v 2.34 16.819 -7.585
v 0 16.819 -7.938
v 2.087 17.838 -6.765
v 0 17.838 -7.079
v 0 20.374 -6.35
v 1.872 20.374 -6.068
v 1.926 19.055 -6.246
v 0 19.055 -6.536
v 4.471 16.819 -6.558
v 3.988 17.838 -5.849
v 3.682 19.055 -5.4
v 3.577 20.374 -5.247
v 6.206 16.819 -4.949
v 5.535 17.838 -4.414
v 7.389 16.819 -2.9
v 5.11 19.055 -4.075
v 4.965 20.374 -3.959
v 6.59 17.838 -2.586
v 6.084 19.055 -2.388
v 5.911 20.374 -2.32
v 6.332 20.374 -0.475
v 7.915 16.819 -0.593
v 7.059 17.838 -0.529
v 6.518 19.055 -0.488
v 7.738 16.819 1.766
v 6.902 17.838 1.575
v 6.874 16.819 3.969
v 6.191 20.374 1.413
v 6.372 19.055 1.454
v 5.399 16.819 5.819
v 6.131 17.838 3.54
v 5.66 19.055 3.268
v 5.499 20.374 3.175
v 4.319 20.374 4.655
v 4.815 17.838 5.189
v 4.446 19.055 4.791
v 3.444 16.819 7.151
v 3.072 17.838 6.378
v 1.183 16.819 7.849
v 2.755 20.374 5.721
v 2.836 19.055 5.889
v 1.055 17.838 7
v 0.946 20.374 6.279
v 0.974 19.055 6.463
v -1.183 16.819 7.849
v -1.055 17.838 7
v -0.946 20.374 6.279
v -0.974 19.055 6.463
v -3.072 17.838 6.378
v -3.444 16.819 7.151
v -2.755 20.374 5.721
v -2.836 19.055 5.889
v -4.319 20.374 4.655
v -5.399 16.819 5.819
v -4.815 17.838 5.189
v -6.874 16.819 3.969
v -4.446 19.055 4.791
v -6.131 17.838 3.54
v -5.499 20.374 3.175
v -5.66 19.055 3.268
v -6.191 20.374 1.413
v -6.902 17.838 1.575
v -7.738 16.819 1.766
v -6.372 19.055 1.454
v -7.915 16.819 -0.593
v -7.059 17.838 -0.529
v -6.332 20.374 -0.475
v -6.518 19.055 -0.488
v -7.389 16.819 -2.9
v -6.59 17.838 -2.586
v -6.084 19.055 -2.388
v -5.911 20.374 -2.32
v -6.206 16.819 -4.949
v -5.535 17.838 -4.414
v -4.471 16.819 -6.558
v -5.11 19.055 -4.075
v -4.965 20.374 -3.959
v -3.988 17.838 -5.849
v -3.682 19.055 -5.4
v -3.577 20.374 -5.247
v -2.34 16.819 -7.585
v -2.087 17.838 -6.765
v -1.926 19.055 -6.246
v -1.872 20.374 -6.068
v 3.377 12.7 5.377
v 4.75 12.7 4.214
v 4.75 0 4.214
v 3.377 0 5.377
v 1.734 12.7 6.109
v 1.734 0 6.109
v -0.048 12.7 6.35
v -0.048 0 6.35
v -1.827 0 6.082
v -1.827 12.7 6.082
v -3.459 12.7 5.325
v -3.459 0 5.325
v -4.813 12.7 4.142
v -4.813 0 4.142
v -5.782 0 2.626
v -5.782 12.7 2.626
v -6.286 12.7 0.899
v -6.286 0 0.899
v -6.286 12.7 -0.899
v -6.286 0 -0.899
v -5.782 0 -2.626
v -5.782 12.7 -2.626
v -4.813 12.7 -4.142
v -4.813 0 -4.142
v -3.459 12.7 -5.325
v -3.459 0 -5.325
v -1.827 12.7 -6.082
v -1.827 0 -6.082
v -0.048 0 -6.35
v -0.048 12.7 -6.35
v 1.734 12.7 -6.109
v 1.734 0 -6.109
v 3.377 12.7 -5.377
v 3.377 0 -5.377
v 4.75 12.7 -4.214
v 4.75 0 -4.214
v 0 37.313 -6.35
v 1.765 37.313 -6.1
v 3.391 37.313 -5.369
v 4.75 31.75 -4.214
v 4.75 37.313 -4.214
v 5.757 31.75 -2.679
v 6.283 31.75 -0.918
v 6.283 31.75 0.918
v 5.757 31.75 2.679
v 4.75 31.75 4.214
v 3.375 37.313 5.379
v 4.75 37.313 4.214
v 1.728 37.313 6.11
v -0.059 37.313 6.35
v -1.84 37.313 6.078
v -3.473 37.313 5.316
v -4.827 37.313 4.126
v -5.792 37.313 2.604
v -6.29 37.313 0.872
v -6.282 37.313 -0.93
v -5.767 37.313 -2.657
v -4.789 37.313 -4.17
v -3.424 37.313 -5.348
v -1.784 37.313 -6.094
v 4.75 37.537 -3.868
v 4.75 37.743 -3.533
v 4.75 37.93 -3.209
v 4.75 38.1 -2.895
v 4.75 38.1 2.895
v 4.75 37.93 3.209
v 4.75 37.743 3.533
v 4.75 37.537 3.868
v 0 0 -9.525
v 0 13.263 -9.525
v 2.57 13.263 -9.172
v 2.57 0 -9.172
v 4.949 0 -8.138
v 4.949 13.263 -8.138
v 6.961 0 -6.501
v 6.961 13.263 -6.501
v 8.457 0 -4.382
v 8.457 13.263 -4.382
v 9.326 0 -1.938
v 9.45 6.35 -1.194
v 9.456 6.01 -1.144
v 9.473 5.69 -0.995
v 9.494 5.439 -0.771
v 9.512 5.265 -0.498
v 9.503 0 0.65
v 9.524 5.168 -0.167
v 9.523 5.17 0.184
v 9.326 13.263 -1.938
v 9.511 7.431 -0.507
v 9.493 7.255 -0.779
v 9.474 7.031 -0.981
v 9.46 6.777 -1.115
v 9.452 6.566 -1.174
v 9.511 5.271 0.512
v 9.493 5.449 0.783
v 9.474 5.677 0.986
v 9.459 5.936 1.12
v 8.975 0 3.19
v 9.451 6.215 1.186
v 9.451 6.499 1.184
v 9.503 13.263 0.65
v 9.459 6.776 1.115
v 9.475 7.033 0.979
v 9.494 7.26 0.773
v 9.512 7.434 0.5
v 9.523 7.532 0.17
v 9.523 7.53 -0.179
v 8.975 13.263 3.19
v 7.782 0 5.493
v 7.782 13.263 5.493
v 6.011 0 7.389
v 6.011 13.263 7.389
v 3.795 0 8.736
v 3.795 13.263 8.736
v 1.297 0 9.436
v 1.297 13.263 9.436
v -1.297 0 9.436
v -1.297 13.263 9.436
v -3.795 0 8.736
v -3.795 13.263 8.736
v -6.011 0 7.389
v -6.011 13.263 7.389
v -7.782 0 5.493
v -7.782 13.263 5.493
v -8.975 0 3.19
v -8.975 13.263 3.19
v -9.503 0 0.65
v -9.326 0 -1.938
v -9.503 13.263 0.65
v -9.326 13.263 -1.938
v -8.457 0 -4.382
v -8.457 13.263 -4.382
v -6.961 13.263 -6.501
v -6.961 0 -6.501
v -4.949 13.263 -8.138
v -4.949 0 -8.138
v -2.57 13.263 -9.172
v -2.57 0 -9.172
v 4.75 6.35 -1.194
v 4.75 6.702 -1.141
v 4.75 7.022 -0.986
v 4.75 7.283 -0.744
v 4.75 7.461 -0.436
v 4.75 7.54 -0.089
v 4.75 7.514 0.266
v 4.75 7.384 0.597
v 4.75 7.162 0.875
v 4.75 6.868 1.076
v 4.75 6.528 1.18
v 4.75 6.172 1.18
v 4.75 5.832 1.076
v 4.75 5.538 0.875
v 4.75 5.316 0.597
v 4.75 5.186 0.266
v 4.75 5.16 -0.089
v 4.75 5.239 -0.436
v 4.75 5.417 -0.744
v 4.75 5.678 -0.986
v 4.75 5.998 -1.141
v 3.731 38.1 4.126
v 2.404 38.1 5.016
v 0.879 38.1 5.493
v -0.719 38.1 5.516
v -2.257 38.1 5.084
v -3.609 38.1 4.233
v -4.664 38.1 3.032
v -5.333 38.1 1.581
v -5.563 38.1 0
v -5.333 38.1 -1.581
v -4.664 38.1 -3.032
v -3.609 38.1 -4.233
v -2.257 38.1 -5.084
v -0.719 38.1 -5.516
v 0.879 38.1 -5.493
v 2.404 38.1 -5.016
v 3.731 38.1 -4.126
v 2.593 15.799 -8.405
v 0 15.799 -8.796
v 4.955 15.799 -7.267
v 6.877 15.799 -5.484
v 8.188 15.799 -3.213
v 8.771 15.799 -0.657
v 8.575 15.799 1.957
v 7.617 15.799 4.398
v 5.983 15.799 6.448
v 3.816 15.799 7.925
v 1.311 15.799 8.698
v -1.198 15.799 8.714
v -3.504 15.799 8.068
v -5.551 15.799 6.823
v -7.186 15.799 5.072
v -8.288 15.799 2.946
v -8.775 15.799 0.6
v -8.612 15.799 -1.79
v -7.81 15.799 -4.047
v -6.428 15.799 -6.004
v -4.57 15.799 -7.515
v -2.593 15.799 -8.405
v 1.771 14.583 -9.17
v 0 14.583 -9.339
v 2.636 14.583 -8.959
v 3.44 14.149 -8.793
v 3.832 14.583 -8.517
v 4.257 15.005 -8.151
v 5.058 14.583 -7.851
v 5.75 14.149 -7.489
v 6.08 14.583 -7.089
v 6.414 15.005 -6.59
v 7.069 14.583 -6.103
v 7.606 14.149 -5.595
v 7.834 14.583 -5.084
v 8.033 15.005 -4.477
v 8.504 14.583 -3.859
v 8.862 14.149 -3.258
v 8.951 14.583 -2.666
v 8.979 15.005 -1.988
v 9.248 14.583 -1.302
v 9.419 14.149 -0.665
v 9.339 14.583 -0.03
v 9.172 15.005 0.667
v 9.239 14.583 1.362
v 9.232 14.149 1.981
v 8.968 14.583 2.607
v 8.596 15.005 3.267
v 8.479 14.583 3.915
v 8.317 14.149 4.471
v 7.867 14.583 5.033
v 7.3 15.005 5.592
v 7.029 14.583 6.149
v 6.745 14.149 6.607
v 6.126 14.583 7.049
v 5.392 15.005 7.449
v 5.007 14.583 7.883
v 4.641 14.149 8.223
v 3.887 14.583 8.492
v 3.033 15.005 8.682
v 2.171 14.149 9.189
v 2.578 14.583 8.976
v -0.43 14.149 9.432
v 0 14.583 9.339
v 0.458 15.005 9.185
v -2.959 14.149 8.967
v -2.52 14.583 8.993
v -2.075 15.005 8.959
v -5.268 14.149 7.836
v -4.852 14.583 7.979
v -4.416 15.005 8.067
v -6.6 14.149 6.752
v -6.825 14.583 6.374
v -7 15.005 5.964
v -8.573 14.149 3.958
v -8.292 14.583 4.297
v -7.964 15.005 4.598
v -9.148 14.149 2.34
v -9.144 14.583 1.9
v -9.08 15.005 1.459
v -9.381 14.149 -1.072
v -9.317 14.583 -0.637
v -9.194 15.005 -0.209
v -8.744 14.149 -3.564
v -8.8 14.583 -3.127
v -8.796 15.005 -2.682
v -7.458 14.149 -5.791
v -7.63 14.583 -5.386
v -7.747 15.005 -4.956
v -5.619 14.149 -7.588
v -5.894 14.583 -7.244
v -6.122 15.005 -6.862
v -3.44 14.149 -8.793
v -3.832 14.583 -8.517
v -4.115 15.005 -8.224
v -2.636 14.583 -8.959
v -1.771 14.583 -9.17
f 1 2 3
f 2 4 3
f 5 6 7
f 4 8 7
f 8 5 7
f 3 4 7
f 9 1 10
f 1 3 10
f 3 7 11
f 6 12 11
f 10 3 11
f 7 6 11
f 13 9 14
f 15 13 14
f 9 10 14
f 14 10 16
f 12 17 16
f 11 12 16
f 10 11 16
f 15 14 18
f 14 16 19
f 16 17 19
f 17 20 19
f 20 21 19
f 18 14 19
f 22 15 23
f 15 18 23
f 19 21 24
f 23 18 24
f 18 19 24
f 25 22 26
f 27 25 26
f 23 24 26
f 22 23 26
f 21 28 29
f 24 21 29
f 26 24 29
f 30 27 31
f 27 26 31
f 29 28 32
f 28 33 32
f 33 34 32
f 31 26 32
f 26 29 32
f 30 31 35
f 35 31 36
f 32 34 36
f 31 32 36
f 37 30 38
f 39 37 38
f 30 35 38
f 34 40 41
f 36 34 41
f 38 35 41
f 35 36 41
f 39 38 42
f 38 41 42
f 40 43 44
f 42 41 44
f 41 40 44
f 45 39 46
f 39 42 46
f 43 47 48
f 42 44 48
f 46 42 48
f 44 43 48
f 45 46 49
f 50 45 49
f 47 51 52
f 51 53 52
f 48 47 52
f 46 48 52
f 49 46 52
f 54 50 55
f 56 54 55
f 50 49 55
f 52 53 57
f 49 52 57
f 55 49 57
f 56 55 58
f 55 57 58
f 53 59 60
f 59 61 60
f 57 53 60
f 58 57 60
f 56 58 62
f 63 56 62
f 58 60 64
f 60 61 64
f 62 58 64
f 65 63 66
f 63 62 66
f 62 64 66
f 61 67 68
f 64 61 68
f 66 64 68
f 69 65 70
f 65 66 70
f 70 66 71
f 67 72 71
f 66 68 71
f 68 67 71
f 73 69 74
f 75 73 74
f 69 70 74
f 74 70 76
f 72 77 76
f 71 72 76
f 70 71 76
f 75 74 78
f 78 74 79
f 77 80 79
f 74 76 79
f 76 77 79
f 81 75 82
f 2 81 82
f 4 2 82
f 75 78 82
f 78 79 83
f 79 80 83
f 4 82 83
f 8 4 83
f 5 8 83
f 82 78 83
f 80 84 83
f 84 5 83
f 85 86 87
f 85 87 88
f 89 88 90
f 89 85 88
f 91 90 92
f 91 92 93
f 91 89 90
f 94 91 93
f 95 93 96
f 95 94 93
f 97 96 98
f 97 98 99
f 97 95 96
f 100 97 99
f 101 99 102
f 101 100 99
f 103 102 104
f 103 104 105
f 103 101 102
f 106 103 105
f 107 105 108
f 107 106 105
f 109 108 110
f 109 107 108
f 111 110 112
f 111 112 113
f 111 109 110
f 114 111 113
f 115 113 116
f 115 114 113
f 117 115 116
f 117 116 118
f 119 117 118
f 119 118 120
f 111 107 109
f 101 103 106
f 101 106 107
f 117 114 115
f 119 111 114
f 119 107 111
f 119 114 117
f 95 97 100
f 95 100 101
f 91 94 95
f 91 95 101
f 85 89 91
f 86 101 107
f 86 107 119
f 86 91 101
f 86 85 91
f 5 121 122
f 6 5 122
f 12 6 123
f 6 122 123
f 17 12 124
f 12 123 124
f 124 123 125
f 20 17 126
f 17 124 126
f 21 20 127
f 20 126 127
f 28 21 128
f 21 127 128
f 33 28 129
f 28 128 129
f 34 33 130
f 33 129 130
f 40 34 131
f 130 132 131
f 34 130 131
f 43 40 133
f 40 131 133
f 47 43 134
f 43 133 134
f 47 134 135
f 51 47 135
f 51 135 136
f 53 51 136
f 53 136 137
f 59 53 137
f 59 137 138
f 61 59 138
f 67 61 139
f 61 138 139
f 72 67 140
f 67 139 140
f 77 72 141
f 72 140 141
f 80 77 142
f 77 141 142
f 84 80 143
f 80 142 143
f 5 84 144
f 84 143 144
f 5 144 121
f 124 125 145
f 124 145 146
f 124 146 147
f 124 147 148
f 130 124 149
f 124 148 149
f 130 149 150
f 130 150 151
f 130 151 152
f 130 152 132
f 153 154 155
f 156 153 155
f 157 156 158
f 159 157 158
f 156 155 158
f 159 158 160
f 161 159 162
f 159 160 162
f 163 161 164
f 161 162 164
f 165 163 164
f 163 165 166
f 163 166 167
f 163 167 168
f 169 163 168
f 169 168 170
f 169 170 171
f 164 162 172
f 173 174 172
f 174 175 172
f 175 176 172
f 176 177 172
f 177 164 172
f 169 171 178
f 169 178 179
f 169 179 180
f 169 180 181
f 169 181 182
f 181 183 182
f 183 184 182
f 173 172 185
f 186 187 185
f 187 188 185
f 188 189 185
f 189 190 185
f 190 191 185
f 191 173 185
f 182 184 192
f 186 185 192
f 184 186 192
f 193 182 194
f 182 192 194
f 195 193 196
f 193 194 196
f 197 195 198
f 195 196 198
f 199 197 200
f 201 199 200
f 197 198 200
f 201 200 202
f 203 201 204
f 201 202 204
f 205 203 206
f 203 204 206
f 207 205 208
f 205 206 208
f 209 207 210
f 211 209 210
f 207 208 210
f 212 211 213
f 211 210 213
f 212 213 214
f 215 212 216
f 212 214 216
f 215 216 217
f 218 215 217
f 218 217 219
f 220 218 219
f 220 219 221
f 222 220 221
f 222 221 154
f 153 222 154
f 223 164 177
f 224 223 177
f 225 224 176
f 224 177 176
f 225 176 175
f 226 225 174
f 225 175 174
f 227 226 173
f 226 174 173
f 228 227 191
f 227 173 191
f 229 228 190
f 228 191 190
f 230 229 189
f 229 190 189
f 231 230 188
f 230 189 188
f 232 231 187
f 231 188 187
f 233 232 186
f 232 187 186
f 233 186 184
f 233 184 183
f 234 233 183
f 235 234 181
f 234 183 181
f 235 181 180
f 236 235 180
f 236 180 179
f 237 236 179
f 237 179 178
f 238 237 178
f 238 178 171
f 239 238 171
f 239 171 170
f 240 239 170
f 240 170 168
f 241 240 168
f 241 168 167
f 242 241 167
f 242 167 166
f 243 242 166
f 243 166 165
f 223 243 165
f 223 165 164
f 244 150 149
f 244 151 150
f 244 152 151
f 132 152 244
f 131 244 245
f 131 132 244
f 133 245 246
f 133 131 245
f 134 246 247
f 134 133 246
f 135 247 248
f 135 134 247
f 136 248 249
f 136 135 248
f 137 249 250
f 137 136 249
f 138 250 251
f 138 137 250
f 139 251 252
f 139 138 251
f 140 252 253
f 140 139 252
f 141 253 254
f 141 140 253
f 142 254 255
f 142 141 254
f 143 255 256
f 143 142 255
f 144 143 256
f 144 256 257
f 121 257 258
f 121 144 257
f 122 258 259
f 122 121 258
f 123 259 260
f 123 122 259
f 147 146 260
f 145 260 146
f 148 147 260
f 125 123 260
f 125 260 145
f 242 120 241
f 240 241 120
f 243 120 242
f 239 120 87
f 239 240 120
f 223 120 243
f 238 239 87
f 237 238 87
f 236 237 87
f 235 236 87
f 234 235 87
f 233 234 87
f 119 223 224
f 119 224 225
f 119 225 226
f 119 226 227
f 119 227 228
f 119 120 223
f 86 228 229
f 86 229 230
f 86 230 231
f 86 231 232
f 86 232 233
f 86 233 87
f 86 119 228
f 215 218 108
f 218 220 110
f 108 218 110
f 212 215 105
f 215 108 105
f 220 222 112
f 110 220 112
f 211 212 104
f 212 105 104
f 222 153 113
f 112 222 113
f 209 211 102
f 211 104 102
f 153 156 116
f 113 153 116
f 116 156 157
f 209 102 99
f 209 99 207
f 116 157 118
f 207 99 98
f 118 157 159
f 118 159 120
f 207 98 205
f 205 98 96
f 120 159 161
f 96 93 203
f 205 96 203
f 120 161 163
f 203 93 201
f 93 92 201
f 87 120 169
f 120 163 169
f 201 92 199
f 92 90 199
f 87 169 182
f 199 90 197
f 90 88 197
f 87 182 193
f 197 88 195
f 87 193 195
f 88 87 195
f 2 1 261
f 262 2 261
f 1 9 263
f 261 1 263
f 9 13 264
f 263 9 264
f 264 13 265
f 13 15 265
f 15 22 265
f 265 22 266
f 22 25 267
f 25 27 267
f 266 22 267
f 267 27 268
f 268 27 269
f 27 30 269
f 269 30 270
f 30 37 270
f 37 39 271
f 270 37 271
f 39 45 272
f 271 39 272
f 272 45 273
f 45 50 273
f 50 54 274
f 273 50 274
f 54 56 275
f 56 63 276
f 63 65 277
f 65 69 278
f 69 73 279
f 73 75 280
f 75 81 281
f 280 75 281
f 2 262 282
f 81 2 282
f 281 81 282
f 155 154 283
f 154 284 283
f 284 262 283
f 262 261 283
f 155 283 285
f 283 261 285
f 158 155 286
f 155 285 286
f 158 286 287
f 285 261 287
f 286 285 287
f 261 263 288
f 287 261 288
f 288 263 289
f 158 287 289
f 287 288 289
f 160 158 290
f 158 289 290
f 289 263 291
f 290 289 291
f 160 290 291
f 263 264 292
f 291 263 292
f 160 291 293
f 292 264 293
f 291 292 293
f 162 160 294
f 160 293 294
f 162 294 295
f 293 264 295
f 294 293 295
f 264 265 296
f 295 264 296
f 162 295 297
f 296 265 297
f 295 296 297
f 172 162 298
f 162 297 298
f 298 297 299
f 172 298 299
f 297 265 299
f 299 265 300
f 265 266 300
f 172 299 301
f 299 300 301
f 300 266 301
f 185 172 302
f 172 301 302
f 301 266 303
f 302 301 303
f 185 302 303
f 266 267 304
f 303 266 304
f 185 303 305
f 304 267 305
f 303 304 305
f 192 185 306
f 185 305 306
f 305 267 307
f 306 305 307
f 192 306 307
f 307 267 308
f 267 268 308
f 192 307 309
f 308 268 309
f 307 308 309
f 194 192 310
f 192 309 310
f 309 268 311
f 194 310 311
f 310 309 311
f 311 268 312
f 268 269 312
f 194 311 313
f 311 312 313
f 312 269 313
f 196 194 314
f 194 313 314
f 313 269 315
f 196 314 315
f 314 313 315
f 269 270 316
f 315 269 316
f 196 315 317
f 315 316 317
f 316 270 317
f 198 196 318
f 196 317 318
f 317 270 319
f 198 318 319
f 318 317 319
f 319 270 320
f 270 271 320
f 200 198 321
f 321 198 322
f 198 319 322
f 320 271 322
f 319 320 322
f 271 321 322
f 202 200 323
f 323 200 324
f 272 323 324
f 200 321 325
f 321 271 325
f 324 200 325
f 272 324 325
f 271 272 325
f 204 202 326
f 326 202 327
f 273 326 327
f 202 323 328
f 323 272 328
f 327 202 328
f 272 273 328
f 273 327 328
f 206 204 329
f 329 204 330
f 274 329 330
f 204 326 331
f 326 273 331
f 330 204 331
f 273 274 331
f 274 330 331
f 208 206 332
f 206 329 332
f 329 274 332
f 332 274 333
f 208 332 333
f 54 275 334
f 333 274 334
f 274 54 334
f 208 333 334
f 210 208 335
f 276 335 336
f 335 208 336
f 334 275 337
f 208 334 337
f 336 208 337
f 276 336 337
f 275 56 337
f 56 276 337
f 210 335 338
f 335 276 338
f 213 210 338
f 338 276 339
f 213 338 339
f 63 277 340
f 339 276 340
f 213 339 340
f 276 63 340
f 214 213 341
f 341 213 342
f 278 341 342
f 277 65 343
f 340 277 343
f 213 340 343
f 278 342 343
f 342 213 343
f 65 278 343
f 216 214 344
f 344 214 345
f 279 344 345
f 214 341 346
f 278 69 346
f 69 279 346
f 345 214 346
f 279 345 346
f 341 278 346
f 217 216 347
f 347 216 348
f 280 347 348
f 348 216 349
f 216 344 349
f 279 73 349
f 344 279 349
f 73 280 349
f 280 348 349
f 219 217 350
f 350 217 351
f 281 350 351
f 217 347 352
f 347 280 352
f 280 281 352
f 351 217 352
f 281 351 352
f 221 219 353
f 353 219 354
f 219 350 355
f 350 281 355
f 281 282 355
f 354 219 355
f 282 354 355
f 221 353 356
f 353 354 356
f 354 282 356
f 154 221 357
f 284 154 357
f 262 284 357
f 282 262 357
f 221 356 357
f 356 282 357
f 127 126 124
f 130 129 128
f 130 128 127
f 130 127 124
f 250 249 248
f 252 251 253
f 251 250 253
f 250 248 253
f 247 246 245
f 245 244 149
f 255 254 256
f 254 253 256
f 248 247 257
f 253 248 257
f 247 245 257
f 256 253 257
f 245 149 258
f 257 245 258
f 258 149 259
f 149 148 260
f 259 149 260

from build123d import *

# Parameters (mm, degrees)
CUT_EXTRUDE_1_DEPTH    = 6.35
CUT_EXTRUDE_START      = -12.7
CUT_EXTRUDE_2_DEPTH    = 12.7
HOLE_WIZARD_M2_1_D     = 2.3876
HOLE_WIZARD_M2_1_DEPTH = 4.7752
CHAMFER_1_SIZE         = 0.7874


with BuildPart() as part:
    # 스케치1 → 회전1 (revolve)
    with BuildSketch(Plane.XY, mode=Mode.PRIVATE) as revolve_1_sk:
        with BuildLine():
            Line((6.35, 38.1), (0, 38.1))
            Line((0, 38.1), (0, 0))
            Line((0, 0), (9.525, 0))
            Line((9.525, 0), (9.525, 13.263233373))
            ThreePointArc((9.525, 13.263233373), (9.110100453, 15.210106507), (7.9375, 16.818666364))
            ThreePointArc((7.9375, 16.818666364), (6.764899547, 18.42722622), (6.35, 20.374099354))
            Line((6.35, 20.374099354), (6.35, 38.1))
        make_face()
    revolve(revolve_1_sk.sketch.rotate(Axis((0, 38.1, 0), (0, -1, 0)), 270), axis=Axis((0, 38.1, 0), (0, -1, 0)))

    # 스케치2 → 컷-돌출1 (cut)
    with BuildSketch(Plane(origin=(0, 38.1, 0), x_dir=(-1, 0, 0), z_dir=(0, 1, 0))):
        with BuildLine():
            Line((-4.7498, -4.214486915), (-4.7498, 4.214486915))
            ThreePointArc((-4.7498, 4.214486915), (-6.35, 0), (-4.7498, -4.214486915))
        make_face()
    extrude(amount=-CUT_EXTRUDE_1_DEPTH, mode=Mode.SUBTRACT)

    # 스케치3 → 컷-돌출2 (cut)
    with BuildSketch(Plane.XZ.offset(CUT_EXTRUDE_START)):
        with BuildLine():
            Line((4.7498, -4.214486915), (4.7498, 4.214486915))
            ThreePointArc((4.7498, 4.214486915), (-6.35, 0), (4.7498, -4.214486915))
        make_face()
    extrude(amount=CUT_EXTRUDE_2_DEPTH, mode=Mode.SUBTRACT)

    # M2 여유 구멍1
    with Locations(Plane.ZY.offset(-4.7498)):
        with Locations((0, 6.35)):
            Hole(HOLE_WIZARD_M2_1_D / 2, depth=HOLE_WIZARD_M2_1_DEPTH)

    # 모따기1
    chamfer_1_edges = [part.edges().sort_by_distance(p)[0] for p in [
        (-5.791566796, 38.1, 2.603892095),
    ]]
    chamfer(chamfer_1_edges, length=CHAMFER_1_SIZE)


solid = part.part
